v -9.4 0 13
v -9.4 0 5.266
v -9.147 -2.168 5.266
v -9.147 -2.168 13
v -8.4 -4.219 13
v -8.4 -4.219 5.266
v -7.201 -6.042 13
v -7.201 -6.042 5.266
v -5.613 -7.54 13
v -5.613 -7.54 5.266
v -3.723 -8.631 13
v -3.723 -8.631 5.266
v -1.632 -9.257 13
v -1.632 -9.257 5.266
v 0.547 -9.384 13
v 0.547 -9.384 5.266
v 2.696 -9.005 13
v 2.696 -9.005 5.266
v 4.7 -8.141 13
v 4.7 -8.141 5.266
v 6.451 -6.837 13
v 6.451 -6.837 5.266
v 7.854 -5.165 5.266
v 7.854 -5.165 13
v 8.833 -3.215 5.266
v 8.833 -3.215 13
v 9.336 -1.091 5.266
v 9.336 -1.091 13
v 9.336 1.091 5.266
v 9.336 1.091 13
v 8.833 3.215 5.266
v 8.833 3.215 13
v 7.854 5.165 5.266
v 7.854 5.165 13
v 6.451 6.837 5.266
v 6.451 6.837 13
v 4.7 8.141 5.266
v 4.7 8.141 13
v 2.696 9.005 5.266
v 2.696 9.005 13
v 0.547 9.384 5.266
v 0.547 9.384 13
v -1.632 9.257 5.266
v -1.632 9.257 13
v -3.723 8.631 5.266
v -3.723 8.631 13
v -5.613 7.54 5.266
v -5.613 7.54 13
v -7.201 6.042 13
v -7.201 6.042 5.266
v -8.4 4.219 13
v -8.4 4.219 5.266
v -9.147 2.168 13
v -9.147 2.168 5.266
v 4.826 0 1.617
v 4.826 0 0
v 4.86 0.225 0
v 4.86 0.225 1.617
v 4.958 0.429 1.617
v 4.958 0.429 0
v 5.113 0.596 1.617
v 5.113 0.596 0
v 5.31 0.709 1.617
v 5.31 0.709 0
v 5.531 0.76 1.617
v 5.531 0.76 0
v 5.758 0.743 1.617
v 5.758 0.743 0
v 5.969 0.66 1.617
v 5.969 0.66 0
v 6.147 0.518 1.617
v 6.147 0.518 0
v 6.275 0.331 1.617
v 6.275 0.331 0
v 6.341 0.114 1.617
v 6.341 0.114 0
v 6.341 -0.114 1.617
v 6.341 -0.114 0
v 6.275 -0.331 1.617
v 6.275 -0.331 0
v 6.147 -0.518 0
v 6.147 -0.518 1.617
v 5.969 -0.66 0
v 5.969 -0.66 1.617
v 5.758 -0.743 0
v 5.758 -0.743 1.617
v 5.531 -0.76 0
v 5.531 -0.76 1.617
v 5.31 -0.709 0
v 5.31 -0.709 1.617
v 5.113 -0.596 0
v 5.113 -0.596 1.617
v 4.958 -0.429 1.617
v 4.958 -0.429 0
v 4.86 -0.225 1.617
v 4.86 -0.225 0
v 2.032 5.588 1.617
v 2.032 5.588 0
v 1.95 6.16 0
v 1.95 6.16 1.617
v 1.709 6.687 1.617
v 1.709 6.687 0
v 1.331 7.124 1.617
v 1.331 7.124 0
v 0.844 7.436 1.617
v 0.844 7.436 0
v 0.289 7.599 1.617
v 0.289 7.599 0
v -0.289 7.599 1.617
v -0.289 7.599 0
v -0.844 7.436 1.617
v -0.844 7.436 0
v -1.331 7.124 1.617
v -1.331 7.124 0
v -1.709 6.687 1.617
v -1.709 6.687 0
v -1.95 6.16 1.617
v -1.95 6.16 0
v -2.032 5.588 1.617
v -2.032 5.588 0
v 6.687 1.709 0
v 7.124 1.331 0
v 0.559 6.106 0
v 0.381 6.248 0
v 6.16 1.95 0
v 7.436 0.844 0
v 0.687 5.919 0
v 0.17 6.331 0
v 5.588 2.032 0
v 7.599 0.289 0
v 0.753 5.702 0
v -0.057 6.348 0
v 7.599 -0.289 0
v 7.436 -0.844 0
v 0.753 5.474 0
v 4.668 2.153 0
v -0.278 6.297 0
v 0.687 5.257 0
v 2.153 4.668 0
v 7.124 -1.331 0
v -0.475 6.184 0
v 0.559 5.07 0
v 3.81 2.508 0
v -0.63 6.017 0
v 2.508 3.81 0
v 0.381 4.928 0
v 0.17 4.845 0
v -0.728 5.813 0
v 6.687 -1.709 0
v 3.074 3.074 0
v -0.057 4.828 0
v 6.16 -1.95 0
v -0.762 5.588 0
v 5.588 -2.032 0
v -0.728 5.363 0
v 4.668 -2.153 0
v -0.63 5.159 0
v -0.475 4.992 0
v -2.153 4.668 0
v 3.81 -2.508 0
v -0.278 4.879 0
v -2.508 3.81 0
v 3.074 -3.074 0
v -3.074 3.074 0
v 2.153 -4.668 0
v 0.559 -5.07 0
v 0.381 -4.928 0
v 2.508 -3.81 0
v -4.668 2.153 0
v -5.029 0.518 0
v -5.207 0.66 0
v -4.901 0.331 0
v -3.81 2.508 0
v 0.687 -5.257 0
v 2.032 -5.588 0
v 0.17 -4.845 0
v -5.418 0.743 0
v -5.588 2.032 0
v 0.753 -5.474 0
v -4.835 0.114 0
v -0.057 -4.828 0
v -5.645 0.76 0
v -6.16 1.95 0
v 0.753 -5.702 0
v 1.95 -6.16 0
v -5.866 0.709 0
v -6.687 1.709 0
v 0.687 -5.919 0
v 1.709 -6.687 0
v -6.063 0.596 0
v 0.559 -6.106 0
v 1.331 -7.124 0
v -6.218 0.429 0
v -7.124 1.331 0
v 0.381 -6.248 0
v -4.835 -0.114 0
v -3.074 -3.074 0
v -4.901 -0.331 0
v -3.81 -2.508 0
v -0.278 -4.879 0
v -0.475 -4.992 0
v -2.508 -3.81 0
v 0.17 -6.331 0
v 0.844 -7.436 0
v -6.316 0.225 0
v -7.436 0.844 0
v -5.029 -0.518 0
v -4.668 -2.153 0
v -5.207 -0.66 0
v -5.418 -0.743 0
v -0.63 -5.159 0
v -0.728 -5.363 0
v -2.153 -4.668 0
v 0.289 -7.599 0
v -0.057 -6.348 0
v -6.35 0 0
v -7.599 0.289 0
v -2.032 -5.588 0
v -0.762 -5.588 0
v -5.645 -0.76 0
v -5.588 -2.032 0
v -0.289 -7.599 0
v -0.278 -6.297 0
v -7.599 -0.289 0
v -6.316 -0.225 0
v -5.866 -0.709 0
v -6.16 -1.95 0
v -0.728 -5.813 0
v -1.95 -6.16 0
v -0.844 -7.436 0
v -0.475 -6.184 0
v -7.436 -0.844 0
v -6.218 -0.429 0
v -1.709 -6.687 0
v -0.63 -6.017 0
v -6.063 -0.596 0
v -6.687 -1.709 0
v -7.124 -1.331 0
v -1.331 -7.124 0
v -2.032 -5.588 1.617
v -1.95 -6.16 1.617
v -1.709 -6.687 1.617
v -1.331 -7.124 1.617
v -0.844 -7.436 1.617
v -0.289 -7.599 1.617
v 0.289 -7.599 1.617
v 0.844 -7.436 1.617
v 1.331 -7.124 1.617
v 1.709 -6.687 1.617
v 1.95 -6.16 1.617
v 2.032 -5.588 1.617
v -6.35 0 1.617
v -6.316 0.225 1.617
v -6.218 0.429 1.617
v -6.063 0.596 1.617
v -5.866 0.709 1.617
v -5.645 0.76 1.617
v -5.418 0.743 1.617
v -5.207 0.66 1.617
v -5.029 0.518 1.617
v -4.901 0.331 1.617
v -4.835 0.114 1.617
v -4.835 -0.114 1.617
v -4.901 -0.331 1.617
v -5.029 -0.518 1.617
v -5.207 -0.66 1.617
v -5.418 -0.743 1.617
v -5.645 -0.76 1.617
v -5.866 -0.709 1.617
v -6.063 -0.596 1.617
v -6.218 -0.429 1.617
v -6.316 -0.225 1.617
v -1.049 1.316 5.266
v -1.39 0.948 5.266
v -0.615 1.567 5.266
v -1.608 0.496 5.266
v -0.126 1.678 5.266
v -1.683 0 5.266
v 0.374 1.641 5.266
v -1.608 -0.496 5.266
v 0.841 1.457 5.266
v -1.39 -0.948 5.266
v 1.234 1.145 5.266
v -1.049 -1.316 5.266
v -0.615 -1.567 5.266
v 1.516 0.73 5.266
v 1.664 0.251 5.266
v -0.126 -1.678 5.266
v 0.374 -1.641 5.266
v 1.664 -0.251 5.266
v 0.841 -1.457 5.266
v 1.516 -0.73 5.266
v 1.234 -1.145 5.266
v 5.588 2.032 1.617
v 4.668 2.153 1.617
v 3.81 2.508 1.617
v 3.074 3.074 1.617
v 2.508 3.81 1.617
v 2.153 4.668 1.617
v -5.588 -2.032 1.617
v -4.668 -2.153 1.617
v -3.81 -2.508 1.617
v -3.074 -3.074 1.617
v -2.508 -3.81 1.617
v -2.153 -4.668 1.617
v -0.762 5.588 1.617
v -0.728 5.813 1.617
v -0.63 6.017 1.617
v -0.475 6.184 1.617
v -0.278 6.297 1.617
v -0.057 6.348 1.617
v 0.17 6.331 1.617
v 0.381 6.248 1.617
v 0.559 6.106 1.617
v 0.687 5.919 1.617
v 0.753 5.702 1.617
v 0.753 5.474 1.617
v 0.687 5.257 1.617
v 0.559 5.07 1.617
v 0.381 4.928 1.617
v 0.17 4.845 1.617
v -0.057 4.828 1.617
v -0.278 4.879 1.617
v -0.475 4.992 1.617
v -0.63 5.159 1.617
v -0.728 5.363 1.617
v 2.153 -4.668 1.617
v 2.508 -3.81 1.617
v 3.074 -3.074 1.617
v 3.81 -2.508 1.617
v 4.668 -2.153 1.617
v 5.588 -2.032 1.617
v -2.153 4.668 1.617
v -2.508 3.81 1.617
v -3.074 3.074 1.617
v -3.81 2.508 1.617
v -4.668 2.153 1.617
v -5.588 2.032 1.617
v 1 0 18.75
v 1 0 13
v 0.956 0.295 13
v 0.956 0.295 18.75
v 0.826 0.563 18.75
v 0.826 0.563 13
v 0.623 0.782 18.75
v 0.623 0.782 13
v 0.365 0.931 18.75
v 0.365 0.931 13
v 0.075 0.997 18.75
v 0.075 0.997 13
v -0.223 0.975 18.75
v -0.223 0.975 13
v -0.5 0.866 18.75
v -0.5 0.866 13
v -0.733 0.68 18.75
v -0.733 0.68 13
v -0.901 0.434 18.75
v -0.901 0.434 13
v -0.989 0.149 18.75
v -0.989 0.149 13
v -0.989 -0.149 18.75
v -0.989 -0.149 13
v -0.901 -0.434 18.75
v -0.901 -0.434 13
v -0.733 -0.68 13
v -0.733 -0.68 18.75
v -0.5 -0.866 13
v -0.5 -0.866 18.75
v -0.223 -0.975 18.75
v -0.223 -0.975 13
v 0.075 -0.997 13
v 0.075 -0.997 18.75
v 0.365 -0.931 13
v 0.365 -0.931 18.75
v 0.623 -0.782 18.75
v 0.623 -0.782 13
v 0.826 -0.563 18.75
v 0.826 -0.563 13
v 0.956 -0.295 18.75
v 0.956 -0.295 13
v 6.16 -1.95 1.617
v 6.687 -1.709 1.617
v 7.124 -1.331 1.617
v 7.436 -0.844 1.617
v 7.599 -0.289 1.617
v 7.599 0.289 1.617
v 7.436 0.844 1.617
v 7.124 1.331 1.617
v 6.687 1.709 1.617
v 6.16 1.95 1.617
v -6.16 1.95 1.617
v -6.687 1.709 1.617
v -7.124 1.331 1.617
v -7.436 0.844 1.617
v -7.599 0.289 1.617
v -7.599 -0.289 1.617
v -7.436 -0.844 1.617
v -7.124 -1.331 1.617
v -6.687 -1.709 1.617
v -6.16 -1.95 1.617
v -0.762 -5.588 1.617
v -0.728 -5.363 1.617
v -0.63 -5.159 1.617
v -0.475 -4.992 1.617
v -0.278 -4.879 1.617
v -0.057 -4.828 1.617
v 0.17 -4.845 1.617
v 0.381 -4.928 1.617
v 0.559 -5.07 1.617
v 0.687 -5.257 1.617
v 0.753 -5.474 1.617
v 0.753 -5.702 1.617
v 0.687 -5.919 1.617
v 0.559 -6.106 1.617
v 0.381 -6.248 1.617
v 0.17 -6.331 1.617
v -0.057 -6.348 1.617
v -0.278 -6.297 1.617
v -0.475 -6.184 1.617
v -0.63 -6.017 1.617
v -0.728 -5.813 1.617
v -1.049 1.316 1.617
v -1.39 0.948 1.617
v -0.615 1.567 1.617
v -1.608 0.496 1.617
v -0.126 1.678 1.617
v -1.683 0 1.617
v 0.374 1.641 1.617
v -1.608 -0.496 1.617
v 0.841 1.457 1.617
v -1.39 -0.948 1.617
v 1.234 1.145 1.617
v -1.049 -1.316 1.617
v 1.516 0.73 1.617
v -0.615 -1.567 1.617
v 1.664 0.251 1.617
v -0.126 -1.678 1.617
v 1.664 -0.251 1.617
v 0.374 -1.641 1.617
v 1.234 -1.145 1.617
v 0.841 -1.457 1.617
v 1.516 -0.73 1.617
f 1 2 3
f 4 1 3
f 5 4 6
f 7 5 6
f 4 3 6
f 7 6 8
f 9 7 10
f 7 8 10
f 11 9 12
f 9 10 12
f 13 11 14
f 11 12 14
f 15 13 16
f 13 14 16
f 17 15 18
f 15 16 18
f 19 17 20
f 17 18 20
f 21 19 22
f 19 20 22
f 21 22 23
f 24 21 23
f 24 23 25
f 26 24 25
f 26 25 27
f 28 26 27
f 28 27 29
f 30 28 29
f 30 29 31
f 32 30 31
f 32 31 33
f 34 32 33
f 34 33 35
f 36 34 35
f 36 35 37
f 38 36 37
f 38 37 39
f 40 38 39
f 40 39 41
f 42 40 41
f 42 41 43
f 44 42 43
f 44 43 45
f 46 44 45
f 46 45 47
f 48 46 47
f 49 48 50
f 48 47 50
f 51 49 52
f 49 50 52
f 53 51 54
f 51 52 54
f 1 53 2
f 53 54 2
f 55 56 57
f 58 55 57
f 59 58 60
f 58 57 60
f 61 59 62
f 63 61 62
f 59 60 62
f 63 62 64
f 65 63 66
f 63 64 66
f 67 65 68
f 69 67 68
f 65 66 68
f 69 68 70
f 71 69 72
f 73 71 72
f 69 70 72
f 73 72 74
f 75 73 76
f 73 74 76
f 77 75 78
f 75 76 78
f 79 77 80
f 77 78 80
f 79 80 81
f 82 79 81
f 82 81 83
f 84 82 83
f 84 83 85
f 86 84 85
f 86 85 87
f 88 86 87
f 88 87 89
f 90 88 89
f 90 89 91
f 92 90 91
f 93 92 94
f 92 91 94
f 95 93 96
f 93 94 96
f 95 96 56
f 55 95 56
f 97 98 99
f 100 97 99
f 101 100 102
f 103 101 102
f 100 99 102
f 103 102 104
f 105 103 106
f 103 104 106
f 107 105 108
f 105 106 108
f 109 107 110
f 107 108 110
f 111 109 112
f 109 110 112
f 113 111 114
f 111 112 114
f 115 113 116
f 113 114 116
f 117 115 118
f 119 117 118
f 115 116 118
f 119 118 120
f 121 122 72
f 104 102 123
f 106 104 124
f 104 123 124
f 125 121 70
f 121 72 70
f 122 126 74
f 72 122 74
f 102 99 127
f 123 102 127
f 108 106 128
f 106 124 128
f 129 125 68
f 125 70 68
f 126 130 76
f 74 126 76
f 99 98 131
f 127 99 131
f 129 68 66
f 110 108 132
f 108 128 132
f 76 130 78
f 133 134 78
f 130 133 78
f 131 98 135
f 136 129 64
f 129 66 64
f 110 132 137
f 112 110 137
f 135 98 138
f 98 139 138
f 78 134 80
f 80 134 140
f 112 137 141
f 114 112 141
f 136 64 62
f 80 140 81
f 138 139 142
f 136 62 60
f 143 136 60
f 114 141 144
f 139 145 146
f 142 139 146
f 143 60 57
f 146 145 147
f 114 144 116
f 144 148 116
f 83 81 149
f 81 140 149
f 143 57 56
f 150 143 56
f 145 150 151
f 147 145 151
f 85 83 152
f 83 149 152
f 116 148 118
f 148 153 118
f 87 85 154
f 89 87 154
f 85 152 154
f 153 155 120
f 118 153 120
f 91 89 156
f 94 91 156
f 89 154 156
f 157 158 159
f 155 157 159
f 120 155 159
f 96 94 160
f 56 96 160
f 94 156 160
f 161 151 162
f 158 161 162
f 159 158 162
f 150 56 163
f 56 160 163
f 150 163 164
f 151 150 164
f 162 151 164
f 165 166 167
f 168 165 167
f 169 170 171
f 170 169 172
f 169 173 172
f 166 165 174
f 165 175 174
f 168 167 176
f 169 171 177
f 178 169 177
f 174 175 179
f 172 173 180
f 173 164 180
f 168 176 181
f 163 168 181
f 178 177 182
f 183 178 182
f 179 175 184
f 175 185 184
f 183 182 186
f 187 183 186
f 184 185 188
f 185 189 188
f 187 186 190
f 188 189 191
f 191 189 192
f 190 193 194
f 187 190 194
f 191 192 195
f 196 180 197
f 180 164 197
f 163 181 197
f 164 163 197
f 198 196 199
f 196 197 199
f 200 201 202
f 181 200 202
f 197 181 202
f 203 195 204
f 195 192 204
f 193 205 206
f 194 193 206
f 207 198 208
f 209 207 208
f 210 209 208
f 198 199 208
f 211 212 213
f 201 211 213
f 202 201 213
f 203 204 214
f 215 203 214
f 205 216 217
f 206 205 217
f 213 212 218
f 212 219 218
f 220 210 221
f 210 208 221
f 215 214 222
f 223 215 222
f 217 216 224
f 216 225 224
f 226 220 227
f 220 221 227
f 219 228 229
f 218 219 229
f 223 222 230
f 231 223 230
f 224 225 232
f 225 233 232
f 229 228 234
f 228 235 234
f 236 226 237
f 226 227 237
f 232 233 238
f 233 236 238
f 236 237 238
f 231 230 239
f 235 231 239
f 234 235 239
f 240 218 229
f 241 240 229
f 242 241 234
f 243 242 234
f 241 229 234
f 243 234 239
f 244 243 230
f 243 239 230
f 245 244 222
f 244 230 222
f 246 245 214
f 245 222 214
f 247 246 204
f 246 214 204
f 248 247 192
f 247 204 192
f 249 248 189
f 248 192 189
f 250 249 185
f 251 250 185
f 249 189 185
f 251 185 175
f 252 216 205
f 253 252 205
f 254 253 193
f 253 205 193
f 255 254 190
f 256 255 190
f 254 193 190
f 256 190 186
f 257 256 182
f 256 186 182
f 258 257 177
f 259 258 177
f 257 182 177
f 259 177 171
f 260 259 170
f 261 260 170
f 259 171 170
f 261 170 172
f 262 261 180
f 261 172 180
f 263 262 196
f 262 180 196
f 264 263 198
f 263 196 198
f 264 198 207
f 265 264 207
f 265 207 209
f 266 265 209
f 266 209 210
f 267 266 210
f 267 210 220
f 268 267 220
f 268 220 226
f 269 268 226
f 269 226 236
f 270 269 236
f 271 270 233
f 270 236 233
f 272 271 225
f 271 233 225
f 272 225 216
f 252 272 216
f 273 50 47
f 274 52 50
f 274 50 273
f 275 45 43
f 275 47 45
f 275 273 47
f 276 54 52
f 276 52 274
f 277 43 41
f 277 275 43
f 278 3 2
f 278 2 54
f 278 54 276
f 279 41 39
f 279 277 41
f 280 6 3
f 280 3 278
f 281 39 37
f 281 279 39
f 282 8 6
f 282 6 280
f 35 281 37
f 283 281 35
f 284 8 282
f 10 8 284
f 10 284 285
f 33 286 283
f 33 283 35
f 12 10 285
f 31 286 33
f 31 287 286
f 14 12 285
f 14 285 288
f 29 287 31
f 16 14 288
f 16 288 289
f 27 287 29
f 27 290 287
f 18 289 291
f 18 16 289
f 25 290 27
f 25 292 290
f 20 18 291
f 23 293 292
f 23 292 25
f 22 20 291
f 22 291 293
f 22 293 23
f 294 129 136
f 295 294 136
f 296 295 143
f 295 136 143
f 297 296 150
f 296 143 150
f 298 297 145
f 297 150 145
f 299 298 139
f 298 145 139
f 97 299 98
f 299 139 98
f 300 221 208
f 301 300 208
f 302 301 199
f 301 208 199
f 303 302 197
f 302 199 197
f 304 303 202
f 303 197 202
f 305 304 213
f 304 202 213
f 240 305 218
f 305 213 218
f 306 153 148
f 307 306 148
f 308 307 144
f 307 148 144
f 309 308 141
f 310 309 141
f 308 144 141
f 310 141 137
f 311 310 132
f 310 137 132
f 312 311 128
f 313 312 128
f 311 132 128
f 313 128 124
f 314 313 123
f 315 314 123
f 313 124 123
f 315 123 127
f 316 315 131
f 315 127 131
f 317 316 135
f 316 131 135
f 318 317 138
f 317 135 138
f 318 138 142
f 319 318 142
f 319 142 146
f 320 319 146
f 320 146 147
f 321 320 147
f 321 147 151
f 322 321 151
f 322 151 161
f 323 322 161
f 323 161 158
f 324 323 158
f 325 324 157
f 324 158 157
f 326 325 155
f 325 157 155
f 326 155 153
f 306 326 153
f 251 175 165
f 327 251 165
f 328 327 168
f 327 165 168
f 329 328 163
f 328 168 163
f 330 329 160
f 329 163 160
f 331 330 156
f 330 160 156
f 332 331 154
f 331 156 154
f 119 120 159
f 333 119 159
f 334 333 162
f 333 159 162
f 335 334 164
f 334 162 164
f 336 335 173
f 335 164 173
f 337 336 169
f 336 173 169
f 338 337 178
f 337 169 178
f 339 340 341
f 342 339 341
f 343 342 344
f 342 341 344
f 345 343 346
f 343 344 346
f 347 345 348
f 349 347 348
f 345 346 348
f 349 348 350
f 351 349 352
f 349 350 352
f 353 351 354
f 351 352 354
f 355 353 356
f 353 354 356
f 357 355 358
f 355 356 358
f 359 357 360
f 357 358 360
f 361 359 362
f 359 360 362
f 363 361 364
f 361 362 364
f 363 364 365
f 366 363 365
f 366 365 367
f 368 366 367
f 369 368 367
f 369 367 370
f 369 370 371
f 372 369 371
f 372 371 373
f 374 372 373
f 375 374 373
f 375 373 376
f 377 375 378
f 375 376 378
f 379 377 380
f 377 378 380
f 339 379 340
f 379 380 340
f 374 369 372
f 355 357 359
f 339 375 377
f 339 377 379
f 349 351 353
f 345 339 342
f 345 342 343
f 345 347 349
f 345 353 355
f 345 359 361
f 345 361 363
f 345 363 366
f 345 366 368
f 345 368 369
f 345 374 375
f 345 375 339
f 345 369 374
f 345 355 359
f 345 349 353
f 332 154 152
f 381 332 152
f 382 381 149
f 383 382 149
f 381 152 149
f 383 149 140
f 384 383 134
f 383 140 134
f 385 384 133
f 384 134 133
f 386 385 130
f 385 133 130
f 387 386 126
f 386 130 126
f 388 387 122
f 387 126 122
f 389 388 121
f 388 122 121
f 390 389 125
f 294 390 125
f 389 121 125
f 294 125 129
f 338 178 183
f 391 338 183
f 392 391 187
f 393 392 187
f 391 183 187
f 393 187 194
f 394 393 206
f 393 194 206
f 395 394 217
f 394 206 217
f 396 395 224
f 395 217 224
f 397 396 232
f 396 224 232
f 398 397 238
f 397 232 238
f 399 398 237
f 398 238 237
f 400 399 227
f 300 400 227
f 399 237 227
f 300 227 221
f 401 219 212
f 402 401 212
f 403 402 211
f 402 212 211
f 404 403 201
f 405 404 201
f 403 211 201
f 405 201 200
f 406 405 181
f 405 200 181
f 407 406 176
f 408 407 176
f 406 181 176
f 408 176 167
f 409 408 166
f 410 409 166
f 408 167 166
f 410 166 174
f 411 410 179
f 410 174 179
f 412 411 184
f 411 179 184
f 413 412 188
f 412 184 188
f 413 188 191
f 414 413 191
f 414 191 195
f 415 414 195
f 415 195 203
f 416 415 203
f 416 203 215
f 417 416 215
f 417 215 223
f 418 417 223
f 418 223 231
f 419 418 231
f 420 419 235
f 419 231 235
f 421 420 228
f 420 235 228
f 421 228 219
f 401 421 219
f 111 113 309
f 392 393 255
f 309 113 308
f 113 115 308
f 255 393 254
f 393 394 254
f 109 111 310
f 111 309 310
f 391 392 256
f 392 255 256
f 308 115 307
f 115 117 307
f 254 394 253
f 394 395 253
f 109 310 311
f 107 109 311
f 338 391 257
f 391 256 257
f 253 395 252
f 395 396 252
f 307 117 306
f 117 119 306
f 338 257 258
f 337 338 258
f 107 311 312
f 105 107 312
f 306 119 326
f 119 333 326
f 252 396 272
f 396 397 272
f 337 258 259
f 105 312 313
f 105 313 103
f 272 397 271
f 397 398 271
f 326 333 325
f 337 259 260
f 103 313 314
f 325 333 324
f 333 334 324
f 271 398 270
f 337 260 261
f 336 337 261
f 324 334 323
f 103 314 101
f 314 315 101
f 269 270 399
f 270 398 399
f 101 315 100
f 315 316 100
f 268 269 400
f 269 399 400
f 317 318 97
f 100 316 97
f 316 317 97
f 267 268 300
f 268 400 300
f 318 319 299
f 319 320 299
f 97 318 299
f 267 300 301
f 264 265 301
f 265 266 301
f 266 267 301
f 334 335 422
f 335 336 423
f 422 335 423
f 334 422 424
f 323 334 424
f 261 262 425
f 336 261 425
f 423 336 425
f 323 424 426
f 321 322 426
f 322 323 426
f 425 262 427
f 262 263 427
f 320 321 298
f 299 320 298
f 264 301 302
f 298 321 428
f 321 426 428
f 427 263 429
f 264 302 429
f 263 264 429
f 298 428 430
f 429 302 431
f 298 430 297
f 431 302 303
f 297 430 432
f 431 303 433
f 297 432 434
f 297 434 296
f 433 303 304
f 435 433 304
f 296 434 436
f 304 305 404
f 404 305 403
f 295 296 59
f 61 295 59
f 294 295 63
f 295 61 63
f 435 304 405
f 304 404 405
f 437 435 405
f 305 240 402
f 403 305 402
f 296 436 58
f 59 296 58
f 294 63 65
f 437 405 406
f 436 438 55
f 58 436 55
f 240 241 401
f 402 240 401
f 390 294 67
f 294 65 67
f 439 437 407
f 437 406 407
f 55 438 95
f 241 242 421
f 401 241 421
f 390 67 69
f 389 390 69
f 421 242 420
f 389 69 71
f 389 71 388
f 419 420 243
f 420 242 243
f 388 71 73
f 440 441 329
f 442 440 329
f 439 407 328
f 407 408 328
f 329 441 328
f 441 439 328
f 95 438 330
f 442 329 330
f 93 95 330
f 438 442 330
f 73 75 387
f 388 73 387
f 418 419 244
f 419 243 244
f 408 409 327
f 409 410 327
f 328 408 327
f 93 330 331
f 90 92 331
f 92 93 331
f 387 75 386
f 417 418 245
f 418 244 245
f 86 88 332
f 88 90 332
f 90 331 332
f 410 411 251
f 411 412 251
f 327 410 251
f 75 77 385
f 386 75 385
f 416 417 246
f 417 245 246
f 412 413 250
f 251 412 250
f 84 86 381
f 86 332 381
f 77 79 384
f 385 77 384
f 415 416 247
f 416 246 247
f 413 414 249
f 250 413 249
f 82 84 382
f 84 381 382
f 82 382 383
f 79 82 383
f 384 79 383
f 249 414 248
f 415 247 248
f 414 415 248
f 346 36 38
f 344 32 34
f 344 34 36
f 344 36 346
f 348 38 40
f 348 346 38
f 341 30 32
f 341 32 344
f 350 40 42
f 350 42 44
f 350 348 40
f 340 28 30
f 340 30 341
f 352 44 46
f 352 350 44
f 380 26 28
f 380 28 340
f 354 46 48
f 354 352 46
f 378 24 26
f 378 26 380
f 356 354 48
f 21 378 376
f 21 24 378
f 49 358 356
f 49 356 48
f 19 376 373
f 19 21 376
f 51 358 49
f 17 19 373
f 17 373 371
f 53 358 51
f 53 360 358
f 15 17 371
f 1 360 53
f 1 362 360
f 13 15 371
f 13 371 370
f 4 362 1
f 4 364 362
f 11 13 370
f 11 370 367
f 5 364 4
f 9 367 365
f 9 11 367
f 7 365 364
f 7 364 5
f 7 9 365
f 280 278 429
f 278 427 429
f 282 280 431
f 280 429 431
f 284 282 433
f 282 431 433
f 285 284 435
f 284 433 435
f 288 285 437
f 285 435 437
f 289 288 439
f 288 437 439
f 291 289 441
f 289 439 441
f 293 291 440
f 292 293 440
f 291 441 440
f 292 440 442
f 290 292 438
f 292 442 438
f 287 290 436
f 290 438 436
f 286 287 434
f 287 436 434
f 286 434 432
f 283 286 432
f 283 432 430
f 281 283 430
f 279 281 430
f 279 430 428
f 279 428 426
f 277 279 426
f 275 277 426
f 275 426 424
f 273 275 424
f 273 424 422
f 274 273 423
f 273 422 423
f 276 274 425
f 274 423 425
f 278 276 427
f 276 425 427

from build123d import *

# Parameters (mm, degrees)
SKETCH1_R           = 9.4
BOSS_EXTRUDE1_DEPTH = 13
SKETCH2_R           = 1
BOSS_EXTRUDE2_DEPTH = 5.75
SKETCH3_W           = 7.717079408
SKETCH3_H           = 3.649036098
SKETCH4_R           = 9.4
SKETCH4_R_2         = 0.762
CUT_EXTRUDE1_DEPTH  = 1.617316387


with BuildPart() as part:
    # Sketch1 → Boss-Extrude1 (new body)
    with BuildSketch(Plane.XY):
        with Locations(Location((0, 0, 0), (0, 0, 180))):
            Circle(SKETCH1_R)
    extrude(amount=BOSS_EXTRUDE1_DEPTH)

    # Sketch2 → Boss-Extrude2 (add)
    with BuildSketch(Plane.XY.offset(13)):
        Circle(SKETCH2_R)
    extrude(amount=BOSS_EXTRUDE2_DEPTH)

    # Sketch3 → Cut-Revolve1 (revolve, cut)
    with BuildSketch(Plane(origin=(0, 0, 0), x_dir=(1, 0, 0), z_dir=(0, 1, 0)), mode=Mode.PRIVATE) as cut_revolve1_sk:
        with Locations((5.541460296, -3.441834436)):
            Rectangle(SKETCH3_W, SKETCH3_H)
    revolve(cut_revolve1_sk.sketch.rotate(Axis((0, 0, 0), (0, 0, 1)), 180), axis=Axis((0, 0, 0), (0, 0, 1)), mode=Mode.SUBTRACT)

    # Sketch4 → Cut-Extrude1 (cut)
    with BuildSketch(Plane(origin=(0, 0, 0), x_dir=(-1, 0, 0), z_dir=(0, 0, -1))):
        Circle(SKETCH4_R)
        with BuildLine():
            ThreePointArc((-2.032, 5.588), (0, 7.62), (2.032, 5.588))
            ThreePointArc((2.032, 5.588), (3.073528286, 3.073528286), (5.588, 2.032))
            ThreePointArc((5.588, 2.032), (7.62, 0), (5.588, -2.032))
            ThreePointArc((5.588, -2.032), (3.073528286, -3.073528286), (2.032, -5.588))
            ThreePointArc((2.032, -5.588), (0, -7.62), (-2.032, -5.588))
            ThreePointArc((-2.032, -5.588), (-3.073528286, -3.073528286), (-5.588, -2.032))
            ThreePointArc((-5.588, -2.032), (-7.62, 0), (-5.588, 2.032))
            ThreePointArc((-5.588, 2.032), (-3.073528286, 3.073528286), (-2.032, 5.588))
        make_face(mode=Mode.SUBTRACT)
        with Locations((0, 5.588)):
            Circle(SKETCH4_R_2)
        with Locations((5.588, 0)):
            Circle(SKETCH4_R_2)
        with Locations((0, -5.588)):
            Circle(SKETCH4_R_2)
        with Locations((-5.588, 0)):
            Circle(SKETCH4_R_2)
    extrude(amount=-CUT_EXTRUDE1_DEPTH, mode=Mode.SUBTRACT)


solid = part.part
